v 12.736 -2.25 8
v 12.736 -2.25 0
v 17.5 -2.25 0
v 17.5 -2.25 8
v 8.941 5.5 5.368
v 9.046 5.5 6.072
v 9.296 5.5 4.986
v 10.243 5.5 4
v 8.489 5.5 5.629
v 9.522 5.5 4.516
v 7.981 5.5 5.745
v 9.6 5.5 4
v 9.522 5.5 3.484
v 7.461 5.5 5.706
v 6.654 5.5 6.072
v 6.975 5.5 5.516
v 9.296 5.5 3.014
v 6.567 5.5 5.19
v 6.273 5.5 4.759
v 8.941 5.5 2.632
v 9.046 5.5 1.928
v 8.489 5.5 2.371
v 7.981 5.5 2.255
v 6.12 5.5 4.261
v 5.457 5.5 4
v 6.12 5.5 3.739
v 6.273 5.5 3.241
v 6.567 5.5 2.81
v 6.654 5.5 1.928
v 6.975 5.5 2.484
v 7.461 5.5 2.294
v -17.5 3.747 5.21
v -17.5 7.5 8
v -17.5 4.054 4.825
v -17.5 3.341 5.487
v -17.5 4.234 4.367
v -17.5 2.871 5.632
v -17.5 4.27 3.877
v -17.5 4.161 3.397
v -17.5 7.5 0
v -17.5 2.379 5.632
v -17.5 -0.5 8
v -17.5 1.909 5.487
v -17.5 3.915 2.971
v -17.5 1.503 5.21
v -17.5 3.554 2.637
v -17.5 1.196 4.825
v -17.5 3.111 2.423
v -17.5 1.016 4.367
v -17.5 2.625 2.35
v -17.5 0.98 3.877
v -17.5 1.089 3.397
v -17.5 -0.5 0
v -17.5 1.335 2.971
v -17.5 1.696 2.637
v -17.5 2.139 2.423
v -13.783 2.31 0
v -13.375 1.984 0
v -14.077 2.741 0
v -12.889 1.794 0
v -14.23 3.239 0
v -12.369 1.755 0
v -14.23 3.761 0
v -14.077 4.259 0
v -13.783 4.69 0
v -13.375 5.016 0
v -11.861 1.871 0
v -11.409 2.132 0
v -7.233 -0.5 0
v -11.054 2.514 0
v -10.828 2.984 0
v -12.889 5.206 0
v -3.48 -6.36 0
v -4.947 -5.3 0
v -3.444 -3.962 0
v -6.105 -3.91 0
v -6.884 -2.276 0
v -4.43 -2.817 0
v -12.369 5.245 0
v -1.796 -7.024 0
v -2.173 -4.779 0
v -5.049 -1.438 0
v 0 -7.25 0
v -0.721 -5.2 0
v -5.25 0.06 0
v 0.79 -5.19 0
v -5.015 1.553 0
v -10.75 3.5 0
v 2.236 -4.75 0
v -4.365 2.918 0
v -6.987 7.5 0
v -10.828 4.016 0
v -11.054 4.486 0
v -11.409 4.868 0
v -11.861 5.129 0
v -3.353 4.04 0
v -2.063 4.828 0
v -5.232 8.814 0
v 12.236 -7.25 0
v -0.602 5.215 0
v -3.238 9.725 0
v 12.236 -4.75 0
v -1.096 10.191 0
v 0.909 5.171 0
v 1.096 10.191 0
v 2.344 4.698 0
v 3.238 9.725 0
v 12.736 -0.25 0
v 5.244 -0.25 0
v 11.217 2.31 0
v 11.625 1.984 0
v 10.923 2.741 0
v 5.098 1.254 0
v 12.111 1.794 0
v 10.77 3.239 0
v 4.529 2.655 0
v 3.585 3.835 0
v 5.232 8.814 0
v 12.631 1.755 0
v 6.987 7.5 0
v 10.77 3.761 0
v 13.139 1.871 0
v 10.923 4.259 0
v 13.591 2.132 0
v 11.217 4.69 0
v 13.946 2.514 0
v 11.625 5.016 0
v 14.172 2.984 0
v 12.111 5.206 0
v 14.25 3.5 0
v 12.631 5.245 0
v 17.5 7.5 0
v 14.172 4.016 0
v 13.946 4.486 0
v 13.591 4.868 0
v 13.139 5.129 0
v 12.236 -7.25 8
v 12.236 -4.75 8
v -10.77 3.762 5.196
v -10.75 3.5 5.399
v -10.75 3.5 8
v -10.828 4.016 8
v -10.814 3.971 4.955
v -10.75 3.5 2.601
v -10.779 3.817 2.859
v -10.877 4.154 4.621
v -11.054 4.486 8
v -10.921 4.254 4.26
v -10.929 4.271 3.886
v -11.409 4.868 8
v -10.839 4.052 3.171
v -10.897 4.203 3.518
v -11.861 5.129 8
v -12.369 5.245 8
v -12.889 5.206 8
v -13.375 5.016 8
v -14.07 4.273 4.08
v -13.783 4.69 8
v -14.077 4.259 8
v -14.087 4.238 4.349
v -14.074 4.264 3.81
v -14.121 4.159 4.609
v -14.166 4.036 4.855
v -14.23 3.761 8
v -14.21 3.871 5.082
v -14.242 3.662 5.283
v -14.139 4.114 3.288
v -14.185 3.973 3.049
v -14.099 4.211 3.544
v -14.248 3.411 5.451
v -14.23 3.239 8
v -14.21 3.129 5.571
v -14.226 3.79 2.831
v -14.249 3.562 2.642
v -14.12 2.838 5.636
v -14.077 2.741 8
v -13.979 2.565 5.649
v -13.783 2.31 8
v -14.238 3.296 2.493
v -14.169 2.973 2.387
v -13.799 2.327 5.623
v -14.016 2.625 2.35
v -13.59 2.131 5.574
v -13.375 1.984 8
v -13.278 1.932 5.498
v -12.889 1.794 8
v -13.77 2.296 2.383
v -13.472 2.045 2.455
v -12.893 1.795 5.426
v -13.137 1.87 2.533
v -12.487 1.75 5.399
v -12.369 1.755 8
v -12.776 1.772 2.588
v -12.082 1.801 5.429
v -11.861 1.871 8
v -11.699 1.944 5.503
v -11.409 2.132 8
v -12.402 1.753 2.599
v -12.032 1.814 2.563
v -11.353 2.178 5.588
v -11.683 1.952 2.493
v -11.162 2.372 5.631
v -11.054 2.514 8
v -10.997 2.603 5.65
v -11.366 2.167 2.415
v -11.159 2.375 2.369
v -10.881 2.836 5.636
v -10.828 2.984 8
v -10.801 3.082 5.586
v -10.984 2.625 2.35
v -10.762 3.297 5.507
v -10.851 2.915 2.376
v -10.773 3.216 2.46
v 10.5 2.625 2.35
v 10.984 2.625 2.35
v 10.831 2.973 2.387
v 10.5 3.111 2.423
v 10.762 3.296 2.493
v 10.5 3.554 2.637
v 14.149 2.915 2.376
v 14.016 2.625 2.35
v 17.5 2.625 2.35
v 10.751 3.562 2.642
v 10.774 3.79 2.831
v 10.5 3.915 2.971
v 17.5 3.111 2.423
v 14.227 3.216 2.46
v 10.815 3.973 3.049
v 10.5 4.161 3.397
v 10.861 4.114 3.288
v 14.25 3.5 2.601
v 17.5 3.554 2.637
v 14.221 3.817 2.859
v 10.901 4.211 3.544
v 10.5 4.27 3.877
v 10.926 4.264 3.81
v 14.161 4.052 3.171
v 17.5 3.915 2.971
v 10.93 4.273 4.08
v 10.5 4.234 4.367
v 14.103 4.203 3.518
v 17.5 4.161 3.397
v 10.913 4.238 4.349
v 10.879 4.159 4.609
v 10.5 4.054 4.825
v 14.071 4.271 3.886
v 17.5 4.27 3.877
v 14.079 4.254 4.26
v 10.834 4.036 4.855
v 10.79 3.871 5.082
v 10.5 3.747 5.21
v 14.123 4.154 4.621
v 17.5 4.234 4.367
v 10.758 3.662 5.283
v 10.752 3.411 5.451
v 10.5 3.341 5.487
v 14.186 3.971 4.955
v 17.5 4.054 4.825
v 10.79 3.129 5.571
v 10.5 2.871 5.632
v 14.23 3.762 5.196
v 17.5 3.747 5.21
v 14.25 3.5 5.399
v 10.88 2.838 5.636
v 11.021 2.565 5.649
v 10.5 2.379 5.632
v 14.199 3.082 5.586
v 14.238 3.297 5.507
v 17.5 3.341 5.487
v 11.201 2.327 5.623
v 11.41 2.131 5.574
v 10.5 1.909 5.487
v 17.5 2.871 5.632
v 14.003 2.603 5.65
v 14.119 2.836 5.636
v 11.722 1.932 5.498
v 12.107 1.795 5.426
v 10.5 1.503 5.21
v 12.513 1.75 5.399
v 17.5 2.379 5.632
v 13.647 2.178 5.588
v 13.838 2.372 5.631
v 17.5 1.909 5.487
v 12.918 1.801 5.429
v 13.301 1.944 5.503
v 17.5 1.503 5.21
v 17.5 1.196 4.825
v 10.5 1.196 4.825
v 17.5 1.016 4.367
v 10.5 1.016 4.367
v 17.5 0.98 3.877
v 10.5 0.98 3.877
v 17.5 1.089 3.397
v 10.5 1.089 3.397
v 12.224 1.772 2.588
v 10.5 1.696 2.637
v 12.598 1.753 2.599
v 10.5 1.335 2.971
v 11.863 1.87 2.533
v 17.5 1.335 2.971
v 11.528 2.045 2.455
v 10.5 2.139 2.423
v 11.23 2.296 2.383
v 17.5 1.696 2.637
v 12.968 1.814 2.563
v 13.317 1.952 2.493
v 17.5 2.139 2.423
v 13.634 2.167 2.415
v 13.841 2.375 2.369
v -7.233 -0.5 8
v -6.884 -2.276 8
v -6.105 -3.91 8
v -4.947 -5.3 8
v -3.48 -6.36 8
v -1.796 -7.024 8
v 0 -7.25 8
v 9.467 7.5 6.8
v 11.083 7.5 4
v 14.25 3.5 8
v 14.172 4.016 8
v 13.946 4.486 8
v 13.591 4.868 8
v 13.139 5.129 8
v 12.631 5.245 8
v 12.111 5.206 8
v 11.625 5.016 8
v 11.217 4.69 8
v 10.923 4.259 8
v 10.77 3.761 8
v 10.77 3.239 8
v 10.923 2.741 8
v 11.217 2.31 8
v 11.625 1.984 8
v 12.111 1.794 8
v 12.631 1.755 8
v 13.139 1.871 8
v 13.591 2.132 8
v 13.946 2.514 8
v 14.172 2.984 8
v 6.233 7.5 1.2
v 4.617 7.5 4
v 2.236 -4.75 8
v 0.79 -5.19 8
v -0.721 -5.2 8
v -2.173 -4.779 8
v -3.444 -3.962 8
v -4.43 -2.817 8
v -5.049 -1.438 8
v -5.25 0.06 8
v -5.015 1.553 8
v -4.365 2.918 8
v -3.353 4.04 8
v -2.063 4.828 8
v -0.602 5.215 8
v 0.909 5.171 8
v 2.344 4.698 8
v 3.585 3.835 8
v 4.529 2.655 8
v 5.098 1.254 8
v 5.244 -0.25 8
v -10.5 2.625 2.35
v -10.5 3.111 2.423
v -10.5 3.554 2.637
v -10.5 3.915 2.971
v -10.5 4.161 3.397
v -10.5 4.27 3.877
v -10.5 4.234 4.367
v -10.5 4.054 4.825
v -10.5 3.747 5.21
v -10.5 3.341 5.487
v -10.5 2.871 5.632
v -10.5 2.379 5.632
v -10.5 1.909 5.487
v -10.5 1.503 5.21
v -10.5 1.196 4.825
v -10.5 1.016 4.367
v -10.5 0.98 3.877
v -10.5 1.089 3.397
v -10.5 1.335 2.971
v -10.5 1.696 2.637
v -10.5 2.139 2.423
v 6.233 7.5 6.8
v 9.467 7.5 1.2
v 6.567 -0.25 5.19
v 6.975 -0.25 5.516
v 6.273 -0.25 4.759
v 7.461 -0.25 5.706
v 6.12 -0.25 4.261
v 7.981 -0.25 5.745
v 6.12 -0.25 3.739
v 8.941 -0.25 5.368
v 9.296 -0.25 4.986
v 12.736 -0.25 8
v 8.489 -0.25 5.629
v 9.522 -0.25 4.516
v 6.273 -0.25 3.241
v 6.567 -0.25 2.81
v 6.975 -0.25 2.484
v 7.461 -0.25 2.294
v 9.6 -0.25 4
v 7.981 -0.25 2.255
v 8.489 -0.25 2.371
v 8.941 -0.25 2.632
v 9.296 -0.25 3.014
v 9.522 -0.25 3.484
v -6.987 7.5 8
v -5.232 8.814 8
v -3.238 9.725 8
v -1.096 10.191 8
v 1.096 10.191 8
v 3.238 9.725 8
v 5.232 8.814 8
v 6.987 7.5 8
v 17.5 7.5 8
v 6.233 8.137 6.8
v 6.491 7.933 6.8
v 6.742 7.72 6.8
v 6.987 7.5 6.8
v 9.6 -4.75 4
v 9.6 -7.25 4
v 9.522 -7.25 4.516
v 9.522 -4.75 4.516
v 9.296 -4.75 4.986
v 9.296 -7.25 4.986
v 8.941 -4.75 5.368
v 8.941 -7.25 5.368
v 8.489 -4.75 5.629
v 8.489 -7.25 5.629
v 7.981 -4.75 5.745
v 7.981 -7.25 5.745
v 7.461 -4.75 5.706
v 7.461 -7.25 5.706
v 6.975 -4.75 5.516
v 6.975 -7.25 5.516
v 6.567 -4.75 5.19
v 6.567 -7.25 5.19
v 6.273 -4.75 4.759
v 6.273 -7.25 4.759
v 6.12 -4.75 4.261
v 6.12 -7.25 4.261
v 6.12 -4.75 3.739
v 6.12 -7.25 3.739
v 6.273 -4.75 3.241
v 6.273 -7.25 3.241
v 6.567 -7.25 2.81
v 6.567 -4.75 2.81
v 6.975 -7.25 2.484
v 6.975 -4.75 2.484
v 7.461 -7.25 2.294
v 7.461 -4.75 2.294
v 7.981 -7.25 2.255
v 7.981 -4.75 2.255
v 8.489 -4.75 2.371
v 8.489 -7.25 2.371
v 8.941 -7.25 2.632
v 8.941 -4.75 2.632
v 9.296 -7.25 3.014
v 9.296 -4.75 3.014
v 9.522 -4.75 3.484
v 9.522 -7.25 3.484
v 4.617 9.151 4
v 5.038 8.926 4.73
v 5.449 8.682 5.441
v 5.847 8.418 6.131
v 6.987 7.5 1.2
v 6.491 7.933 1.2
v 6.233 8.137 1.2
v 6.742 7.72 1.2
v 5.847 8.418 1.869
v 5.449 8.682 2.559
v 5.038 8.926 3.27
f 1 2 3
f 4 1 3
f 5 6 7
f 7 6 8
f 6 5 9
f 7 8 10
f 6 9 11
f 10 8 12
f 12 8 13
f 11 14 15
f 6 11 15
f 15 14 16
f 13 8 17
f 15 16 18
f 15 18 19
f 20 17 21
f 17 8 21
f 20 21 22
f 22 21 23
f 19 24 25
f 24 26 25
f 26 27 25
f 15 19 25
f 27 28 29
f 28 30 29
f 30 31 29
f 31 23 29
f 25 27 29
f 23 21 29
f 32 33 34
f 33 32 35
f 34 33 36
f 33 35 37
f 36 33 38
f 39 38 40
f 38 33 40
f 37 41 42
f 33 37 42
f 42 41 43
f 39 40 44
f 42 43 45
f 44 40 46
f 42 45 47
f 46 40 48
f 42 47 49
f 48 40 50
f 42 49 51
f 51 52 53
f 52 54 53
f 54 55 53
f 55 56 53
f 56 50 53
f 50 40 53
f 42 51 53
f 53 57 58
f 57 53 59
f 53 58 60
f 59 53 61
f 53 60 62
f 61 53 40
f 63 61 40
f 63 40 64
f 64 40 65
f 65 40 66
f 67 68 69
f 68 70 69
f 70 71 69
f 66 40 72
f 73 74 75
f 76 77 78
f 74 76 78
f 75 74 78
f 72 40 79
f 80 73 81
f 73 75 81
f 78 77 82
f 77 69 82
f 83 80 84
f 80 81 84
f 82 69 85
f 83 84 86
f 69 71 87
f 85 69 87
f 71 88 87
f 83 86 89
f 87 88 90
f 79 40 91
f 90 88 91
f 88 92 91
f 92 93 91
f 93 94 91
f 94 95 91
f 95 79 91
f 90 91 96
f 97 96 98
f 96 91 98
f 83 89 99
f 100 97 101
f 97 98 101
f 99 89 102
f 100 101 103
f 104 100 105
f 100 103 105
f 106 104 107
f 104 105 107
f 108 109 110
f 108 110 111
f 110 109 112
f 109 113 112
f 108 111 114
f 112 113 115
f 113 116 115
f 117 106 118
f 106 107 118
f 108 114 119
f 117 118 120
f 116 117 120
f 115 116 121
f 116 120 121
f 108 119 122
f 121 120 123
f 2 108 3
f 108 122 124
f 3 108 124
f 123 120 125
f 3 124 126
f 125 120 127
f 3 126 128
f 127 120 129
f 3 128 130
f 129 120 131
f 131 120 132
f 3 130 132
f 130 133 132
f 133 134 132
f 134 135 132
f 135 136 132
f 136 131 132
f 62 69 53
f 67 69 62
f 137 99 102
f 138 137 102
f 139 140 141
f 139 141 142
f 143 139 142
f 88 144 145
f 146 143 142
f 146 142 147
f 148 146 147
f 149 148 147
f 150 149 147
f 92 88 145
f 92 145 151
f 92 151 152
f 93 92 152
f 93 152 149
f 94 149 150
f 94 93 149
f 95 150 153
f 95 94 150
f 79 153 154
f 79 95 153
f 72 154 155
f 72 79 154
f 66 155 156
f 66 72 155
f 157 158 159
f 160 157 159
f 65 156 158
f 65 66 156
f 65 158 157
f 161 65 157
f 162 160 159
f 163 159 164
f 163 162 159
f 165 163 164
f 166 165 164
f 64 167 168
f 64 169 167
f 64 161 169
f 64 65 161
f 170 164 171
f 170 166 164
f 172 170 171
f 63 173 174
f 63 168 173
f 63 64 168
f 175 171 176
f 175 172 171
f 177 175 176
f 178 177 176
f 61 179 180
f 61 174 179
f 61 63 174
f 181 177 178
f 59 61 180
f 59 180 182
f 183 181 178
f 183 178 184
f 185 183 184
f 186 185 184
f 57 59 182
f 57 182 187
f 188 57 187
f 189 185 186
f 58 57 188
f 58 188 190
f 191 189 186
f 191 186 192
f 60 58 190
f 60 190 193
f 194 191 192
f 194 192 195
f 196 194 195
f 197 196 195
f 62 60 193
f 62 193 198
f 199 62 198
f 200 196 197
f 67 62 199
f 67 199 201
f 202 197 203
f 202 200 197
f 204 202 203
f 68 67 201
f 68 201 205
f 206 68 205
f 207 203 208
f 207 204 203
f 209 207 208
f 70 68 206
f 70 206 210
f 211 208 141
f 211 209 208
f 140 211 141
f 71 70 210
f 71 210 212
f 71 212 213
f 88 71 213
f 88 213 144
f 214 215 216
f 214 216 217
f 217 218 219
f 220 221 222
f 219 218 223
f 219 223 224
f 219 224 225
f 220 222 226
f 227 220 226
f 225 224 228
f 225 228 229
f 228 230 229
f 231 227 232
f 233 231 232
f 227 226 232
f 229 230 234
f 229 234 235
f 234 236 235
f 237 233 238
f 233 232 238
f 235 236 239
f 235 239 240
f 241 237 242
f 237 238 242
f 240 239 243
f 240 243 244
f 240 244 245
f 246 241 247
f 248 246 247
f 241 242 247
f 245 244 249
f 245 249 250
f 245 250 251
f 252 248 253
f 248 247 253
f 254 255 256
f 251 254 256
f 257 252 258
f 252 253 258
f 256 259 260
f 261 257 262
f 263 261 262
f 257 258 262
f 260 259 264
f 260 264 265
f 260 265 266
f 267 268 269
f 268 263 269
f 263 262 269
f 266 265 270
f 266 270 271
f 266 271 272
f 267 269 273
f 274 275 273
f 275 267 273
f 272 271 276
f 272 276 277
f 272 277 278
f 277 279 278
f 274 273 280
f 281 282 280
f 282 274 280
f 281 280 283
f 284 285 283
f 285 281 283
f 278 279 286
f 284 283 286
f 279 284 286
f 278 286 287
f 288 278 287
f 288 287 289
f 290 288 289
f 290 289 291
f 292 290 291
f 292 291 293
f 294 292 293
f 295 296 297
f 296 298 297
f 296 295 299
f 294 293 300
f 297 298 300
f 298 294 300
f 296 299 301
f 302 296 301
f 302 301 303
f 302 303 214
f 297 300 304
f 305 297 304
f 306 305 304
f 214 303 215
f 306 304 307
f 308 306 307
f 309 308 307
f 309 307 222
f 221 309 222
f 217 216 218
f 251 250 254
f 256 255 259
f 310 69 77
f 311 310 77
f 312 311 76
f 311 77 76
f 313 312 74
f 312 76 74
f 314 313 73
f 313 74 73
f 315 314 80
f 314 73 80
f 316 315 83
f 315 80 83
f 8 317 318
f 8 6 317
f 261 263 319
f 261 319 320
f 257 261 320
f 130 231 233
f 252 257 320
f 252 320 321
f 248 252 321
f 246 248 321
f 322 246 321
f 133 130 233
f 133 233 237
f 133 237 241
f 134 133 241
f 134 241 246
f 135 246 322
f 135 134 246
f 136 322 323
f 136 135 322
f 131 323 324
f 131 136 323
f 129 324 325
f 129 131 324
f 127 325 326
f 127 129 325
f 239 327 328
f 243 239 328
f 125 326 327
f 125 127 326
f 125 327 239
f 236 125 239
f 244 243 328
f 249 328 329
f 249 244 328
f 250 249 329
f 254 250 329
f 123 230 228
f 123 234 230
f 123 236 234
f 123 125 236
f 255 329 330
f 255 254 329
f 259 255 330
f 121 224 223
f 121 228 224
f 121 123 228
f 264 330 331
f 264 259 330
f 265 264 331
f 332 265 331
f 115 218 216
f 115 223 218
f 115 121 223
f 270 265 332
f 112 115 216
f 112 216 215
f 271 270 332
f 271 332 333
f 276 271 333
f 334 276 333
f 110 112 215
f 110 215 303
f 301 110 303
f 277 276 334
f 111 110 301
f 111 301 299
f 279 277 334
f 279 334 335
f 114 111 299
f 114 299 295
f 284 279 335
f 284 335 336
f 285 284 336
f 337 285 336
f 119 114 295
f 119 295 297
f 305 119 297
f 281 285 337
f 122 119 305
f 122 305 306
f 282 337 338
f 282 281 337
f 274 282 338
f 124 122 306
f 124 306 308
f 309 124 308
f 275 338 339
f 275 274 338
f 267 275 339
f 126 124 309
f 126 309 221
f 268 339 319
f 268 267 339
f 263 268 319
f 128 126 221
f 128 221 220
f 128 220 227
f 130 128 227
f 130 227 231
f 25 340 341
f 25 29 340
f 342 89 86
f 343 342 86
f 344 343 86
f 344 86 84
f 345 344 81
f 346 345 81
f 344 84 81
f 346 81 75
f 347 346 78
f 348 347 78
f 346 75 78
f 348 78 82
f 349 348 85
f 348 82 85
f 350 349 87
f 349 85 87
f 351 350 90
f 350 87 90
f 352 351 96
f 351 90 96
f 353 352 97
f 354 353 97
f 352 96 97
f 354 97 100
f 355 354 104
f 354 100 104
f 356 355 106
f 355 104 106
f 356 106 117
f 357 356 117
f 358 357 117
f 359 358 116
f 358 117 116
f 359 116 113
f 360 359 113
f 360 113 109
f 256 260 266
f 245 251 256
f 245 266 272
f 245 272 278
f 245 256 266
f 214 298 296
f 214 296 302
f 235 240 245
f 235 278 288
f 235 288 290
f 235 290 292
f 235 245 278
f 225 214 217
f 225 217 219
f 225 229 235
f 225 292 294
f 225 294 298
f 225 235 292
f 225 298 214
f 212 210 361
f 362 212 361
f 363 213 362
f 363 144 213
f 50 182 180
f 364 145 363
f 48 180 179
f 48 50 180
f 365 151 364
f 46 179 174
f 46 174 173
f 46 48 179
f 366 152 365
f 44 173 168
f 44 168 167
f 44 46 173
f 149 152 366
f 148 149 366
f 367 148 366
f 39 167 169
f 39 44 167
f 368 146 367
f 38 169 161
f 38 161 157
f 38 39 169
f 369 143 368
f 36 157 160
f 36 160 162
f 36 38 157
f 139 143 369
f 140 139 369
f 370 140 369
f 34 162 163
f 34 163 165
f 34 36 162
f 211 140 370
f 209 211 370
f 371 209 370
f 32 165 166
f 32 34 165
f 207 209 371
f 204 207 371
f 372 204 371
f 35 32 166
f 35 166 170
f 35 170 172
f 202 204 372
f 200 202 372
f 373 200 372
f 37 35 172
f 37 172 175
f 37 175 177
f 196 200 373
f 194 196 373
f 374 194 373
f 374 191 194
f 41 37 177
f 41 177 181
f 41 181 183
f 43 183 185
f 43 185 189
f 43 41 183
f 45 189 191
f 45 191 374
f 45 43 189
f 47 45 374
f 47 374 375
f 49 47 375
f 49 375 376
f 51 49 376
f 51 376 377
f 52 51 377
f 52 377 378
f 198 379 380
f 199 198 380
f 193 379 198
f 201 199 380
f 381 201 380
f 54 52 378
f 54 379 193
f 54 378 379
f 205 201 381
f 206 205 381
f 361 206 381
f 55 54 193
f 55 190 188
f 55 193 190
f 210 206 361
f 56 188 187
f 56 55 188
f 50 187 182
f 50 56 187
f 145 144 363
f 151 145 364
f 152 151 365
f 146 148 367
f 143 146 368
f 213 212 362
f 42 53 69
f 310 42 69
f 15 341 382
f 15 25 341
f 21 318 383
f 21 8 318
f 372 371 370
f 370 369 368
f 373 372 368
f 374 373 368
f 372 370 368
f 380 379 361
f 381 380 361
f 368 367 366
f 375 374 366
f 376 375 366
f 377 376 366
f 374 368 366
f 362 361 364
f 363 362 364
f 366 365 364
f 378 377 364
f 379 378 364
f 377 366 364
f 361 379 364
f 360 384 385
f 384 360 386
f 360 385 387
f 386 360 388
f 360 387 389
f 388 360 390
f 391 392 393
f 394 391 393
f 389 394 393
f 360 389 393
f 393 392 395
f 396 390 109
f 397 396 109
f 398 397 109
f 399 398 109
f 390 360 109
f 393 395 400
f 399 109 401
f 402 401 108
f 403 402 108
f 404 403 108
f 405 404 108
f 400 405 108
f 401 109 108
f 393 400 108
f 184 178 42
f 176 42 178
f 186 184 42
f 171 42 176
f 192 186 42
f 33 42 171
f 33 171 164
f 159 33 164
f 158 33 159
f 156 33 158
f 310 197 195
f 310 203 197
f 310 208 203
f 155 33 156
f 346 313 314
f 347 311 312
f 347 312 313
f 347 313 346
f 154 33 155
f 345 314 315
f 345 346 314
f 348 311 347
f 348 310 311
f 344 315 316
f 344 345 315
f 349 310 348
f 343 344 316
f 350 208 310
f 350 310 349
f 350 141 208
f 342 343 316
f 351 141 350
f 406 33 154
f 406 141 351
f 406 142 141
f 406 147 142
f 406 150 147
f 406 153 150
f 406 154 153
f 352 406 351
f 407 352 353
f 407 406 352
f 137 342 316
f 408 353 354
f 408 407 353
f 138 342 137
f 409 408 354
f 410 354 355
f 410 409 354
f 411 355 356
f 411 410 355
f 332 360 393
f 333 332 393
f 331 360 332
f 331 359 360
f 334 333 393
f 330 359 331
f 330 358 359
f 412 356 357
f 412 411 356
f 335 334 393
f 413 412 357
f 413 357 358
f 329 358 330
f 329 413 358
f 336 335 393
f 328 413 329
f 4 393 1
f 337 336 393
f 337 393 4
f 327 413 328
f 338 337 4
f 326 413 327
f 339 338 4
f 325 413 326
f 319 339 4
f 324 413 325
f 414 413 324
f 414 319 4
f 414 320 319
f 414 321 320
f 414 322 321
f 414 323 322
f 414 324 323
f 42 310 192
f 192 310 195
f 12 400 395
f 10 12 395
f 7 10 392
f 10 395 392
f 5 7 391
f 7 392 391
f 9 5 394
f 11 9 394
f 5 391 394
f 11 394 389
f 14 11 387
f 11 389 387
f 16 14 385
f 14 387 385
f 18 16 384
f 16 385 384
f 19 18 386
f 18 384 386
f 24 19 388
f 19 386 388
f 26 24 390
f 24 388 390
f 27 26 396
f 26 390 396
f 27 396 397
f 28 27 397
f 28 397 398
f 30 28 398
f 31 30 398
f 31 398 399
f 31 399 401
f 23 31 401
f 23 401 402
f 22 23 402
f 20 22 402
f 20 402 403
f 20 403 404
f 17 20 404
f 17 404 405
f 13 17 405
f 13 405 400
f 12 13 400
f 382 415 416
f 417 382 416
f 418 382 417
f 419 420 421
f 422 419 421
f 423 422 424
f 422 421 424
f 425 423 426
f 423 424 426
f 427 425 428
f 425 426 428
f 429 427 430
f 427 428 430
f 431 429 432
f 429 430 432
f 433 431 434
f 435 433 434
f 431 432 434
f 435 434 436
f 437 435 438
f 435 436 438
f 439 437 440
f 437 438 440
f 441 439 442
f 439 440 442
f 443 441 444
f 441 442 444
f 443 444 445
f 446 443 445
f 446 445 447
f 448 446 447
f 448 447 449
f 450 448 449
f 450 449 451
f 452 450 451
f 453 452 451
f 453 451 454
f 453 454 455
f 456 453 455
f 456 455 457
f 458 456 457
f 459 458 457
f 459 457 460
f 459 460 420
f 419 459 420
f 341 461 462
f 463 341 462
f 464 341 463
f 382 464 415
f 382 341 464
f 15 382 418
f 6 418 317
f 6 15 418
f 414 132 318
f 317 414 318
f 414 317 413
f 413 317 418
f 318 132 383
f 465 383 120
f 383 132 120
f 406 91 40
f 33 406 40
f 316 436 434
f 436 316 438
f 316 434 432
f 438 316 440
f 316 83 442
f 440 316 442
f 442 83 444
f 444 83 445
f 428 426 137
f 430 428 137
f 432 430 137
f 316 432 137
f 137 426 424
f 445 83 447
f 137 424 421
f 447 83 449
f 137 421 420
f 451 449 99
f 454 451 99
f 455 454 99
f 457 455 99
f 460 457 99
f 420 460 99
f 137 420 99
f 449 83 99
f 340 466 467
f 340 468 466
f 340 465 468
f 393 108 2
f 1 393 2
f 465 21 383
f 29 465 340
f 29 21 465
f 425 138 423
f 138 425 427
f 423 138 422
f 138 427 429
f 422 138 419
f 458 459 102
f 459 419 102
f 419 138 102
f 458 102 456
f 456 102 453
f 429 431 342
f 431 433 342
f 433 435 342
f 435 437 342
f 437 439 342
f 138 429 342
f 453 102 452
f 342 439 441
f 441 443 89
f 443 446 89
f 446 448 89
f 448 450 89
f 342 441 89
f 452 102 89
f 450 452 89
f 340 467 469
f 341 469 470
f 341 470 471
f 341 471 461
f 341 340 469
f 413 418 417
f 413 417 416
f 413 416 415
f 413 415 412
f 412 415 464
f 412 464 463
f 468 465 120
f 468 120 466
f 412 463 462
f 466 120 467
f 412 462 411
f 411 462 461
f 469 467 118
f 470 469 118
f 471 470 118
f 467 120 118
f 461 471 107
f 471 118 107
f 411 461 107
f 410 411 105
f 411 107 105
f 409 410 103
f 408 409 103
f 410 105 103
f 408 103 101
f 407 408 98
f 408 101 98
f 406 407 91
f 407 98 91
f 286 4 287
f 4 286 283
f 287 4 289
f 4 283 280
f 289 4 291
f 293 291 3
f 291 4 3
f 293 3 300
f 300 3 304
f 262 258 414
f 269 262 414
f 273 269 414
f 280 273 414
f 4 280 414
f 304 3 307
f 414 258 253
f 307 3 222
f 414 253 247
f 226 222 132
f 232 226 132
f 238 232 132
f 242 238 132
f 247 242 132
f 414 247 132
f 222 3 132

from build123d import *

# Parameters (mm, degrees)
ESBO_O1_R                       = 1.75
RESSALTO_EXTRUS_O1_DEPTH        = 8
ESBO_O2_R                       = 1.65
CORTE_EXTRUS_O1_DEPTH           = 7
ESBO_O3_R                       = 1.75
CORTE_EXTRUS_O2_DEPTH           = 18.5
CORTE_EXTRUS_O3_DEPTH           = 2
CORTE_EXTRUS_O3_TAPER           = 20
CORTE_EXTRUS_O3_OTHER_WAY_DEPTH = 6


with BuildPart() as part:
    # Esboço1 → Ressalto-extrusão1 (new body)
    with BuildSketch(Plane.XY):
        with BuildLine():
            Line((17.5, 7.5), (6.986594306, 7.5))
            ThreePointArc((6.986594306, 7.5), (0, 10.25), (-6.986594306, 7.5))
            Line((-6.986594306, 7.5), (-17.5, 7.5))
            Line((-17.5, 7.5), (-17.5, -0.5))
            Line((-17.5, -0.5), (-7.232738071, -0.5))
            ThreePointArc((-7.232738071, -0.5), (-4.946589734, -5.300353762), (0, -7.25))
            Line((0, -7.25), (12.236067977, -7.25))
            Line((12.236067977, -7.25), (12.236067977, -4.75))
            Line((12.236067977, -4.75), (2.236067977, -4.75))
            ThreePointArc((2.236067977, -4.75), (-4.364690104, 2.917529829), (5.244044241, -0.25))
            Line((5.244044241, -0.25), (12.736067977, -0.25))
            Line((12.736067977, -0.25), (12.736067977, -2.25))
            Line((12.736067977, -2.25), (15.807189139, -2.25))
            Line((15.807189139, -2.25), (17.5, -2.25))
            Line((17.5, -2.25), (17.5, 7.5))
        make_face()
        with Locations((12.5, 3.5)):
            Circle(ESBO_O1_R, mode=Mode.SUBTRACT)
        with Locations((-12.5, 3.5)):
            Circle(ESBO_O1_R, mode=Mode.SUBTRACT)
    extrude(amount=RESSALTO_EXTRUS_O1_DEPTH)

    # Esboço2 → Corte-extrusão1 (cut)
    with BuildSketch(Plane(origin=(17.5, 0, 0), x_dir=(0, 0, -1), z_dir=(1, 0, 0))):
        with Locations((-4, 2.625)):
            Circle(ESBO_O2_R)
    corte_extrus_o1 = extrude(amount=-CORTE_EXTRUS_O1_DEPTH, mode=Mode.SUBTRACT)

    # Espelhar1: Corte-extrusão1 across plane
    add(corte_extrus_o1.mirror(Plane(origin=(0, 0, 0), x_dir=(0, 0, 1), z_dir=(1, 0, 0))), mode=Mode.SUBTRACT)

    # Esboço3 → Corte-extrusão2 (cut, through all)
    with BuildSketch(Plane.XZ.offset(7.25)):
        with Locations((7.85, 4)):
            Circle(ESBO_O3_R)
    extrude(amount=-CORTE_EXTRUS_O2_DEPTH, mode=Mode.SUBTRACT)

    # Esboço4 → Corte-extrusão3 (cut)
    with BuildSketch(Plane(origin=(0, 7.5, 0), x_dir=(1, 0, 0), z_dir=(0, 1, 0))):
        Polygon((11.083161507, -4), (9.466580754, -1.2), (6.233419246, -1.2), (4.616838493, -4), (6.233419246, -6.8), (9.466580754, -6.8), align=None)
    extrude(amount=-CORTE_EXTRUS_O3_DEPTH, taper=CORTE_EXTRUS_O3_TAPER, mode=Mode.SUBTRACT)

    # Esboço4 → Corte-extrusão3 other way (cut)
    with BuildSketch(Plane(origin=(0, 7.5, 0), x_dir=(1, 0, 0), z_dir=(0, 1, 0))):
        Polygon((11.083161507, -4), (9.466580754, -1.2), (6.233419246, -1.2), (4.616838493, -4), (6.233419246, -6.8), (9.466580754, -6.8), align=None)
    extrude(amount=CORTE_EXTRUS_O3_OTHER_WAY_DEPTH, mode=Mode.SUBTRACT)


solid = part.part
